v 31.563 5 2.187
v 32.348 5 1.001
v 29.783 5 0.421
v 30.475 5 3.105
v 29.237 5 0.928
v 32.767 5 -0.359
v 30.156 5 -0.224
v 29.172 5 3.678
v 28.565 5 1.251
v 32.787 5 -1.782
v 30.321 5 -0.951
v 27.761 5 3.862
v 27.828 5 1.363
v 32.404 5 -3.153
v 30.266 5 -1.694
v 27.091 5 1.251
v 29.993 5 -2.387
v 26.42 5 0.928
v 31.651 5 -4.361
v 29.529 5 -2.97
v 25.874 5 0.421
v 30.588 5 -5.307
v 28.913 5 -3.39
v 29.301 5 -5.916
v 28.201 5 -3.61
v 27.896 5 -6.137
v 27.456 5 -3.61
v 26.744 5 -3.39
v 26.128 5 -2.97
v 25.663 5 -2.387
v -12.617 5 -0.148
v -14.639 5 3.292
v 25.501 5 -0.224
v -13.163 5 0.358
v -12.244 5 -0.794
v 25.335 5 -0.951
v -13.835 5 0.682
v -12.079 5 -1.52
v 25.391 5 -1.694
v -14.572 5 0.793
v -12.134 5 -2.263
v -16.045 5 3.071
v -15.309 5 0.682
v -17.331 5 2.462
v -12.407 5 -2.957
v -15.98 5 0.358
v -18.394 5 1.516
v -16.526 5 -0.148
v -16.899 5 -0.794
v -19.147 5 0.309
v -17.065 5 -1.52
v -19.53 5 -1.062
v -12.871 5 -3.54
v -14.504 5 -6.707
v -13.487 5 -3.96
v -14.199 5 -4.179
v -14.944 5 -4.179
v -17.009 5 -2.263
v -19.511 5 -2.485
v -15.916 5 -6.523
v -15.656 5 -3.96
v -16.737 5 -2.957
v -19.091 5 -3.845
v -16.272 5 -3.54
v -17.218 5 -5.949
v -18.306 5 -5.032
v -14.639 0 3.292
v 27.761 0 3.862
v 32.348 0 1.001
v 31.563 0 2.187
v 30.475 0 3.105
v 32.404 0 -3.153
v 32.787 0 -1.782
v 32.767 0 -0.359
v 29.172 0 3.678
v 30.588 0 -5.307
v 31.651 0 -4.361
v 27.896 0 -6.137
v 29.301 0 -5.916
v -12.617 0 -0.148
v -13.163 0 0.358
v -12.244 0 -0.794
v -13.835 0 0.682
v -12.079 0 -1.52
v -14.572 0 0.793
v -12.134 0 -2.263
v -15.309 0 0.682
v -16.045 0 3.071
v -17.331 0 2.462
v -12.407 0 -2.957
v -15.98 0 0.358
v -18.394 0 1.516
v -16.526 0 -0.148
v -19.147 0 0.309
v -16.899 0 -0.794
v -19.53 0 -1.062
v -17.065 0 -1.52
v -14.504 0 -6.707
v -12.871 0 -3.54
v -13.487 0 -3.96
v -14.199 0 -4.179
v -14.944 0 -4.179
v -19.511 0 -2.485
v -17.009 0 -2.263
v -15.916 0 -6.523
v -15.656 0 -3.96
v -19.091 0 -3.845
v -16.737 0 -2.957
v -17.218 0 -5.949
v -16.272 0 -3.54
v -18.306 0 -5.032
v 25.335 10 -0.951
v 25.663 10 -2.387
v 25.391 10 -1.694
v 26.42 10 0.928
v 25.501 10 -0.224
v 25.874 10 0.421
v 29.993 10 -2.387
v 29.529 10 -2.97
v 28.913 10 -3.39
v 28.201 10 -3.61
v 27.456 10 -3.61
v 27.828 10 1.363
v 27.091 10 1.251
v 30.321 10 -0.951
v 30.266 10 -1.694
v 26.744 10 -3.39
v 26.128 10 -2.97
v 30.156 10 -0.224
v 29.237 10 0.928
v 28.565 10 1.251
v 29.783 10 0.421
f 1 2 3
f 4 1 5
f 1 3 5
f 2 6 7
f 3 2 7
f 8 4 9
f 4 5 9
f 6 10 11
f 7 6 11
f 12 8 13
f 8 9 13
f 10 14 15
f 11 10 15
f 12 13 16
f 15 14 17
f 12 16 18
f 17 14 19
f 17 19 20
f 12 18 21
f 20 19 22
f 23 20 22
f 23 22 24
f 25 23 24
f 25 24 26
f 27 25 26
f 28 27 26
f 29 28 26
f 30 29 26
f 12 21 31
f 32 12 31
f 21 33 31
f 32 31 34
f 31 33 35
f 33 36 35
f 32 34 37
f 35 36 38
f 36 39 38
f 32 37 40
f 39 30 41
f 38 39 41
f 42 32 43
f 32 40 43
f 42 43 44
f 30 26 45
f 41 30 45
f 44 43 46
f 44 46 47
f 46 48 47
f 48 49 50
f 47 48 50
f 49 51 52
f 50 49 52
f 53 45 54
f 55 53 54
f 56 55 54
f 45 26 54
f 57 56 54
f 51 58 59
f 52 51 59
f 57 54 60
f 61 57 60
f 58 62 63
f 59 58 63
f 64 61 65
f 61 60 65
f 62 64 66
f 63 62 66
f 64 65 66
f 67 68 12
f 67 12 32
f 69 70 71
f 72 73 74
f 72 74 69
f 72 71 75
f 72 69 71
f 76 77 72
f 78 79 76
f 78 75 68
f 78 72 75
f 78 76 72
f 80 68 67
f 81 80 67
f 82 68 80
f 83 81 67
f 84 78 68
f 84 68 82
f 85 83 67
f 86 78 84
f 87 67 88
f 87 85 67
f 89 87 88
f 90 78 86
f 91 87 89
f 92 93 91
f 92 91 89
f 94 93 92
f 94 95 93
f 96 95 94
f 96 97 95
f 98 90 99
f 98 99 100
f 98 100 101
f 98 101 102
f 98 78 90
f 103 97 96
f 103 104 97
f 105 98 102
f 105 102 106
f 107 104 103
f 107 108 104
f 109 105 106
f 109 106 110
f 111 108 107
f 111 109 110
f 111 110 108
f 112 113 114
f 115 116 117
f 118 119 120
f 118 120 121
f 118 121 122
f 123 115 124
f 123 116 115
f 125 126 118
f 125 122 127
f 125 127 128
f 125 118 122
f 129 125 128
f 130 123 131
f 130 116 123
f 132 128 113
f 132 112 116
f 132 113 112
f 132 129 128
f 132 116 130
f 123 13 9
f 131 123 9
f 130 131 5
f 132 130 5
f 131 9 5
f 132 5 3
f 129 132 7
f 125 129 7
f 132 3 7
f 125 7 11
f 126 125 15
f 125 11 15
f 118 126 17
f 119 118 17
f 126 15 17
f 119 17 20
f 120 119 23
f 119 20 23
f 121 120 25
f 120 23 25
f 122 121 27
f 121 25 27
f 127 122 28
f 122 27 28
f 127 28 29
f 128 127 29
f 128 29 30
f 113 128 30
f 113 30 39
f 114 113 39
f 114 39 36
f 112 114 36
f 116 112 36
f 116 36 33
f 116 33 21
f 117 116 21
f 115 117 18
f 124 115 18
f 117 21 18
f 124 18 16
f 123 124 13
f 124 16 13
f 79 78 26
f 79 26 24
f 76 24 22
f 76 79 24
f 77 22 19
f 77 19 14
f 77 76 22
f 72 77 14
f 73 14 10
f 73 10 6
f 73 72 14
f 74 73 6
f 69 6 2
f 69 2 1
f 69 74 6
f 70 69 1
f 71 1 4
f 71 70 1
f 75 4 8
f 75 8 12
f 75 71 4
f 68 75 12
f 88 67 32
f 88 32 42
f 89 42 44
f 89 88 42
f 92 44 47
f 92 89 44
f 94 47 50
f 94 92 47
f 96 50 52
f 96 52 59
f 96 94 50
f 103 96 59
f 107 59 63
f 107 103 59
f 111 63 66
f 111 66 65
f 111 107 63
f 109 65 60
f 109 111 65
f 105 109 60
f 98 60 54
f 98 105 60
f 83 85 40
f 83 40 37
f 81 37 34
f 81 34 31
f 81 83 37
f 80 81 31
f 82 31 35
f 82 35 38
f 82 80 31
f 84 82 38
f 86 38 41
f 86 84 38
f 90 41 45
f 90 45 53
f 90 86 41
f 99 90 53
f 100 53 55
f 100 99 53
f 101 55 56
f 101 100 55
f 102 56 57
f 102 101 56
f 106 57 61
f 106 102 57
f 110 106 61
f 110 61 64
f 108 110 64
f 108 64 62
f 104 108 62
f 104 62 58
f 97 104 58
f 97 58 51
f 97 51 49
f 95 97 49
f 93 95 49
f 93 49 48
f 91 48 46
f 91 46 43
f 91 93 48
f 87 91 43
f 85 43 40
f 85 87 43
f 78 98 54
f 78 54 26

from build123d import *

# Parameters (mm, degrees)
SKETCH1_R           = 2.5
BOSS_EXTRUDE1_DEPTH = 5
SKETCH2_R           = 2.5
BOSS_EXTRUDE2_DEPTH = 5


with BuildPart() as part:
    # Sketch1 → Boss-Extrude1 (new body)
    with BuildSketch(Plane(origin=(0, 0, 0), x_dir=(1, 0, 0), z_dir=(0, 1, 0))):
        with BuildLine():
            Line((-14.504443595, 6.706697569), (27.895556405, 6.137023864))
            ThreePointArc((27.895556405, 6.137023864), (32.82793273, 1.070302658), (27.761211524, -3.862073668))
            Line((27.761211524, -3.862073668), (-14.638788476, -3.292399963))
            ThreePointArc((-14.638788476, -3.292399963), (-19.571164802, 1.774321243), (-14.504443595, 6.706697569))
        make_face()
        with Locations(Location((-14.571616036, 1.707148803, 0), (0, 0, 270))):
            Circle(SKETCH1_R, mode=Mode.SUBTRACT)
    extrude(amount=BOSS_EXTRUDE1_DEPTH)

    # Sketch2 → Boss-Extrude2 (add)
    with BuildSketch(Plane(origin=(0, 5, 0), x_dir=(1, 0, 0), z_dir=(0, 1, 0))):
        with Locations(Location((27.828383964, 1.137475098, 0), (0, 0, 270))):
            Circle(SKETCH2_R)
    extrude(amount=BOSS_EXTRUDE2_DEPTH)


solid = part.part
